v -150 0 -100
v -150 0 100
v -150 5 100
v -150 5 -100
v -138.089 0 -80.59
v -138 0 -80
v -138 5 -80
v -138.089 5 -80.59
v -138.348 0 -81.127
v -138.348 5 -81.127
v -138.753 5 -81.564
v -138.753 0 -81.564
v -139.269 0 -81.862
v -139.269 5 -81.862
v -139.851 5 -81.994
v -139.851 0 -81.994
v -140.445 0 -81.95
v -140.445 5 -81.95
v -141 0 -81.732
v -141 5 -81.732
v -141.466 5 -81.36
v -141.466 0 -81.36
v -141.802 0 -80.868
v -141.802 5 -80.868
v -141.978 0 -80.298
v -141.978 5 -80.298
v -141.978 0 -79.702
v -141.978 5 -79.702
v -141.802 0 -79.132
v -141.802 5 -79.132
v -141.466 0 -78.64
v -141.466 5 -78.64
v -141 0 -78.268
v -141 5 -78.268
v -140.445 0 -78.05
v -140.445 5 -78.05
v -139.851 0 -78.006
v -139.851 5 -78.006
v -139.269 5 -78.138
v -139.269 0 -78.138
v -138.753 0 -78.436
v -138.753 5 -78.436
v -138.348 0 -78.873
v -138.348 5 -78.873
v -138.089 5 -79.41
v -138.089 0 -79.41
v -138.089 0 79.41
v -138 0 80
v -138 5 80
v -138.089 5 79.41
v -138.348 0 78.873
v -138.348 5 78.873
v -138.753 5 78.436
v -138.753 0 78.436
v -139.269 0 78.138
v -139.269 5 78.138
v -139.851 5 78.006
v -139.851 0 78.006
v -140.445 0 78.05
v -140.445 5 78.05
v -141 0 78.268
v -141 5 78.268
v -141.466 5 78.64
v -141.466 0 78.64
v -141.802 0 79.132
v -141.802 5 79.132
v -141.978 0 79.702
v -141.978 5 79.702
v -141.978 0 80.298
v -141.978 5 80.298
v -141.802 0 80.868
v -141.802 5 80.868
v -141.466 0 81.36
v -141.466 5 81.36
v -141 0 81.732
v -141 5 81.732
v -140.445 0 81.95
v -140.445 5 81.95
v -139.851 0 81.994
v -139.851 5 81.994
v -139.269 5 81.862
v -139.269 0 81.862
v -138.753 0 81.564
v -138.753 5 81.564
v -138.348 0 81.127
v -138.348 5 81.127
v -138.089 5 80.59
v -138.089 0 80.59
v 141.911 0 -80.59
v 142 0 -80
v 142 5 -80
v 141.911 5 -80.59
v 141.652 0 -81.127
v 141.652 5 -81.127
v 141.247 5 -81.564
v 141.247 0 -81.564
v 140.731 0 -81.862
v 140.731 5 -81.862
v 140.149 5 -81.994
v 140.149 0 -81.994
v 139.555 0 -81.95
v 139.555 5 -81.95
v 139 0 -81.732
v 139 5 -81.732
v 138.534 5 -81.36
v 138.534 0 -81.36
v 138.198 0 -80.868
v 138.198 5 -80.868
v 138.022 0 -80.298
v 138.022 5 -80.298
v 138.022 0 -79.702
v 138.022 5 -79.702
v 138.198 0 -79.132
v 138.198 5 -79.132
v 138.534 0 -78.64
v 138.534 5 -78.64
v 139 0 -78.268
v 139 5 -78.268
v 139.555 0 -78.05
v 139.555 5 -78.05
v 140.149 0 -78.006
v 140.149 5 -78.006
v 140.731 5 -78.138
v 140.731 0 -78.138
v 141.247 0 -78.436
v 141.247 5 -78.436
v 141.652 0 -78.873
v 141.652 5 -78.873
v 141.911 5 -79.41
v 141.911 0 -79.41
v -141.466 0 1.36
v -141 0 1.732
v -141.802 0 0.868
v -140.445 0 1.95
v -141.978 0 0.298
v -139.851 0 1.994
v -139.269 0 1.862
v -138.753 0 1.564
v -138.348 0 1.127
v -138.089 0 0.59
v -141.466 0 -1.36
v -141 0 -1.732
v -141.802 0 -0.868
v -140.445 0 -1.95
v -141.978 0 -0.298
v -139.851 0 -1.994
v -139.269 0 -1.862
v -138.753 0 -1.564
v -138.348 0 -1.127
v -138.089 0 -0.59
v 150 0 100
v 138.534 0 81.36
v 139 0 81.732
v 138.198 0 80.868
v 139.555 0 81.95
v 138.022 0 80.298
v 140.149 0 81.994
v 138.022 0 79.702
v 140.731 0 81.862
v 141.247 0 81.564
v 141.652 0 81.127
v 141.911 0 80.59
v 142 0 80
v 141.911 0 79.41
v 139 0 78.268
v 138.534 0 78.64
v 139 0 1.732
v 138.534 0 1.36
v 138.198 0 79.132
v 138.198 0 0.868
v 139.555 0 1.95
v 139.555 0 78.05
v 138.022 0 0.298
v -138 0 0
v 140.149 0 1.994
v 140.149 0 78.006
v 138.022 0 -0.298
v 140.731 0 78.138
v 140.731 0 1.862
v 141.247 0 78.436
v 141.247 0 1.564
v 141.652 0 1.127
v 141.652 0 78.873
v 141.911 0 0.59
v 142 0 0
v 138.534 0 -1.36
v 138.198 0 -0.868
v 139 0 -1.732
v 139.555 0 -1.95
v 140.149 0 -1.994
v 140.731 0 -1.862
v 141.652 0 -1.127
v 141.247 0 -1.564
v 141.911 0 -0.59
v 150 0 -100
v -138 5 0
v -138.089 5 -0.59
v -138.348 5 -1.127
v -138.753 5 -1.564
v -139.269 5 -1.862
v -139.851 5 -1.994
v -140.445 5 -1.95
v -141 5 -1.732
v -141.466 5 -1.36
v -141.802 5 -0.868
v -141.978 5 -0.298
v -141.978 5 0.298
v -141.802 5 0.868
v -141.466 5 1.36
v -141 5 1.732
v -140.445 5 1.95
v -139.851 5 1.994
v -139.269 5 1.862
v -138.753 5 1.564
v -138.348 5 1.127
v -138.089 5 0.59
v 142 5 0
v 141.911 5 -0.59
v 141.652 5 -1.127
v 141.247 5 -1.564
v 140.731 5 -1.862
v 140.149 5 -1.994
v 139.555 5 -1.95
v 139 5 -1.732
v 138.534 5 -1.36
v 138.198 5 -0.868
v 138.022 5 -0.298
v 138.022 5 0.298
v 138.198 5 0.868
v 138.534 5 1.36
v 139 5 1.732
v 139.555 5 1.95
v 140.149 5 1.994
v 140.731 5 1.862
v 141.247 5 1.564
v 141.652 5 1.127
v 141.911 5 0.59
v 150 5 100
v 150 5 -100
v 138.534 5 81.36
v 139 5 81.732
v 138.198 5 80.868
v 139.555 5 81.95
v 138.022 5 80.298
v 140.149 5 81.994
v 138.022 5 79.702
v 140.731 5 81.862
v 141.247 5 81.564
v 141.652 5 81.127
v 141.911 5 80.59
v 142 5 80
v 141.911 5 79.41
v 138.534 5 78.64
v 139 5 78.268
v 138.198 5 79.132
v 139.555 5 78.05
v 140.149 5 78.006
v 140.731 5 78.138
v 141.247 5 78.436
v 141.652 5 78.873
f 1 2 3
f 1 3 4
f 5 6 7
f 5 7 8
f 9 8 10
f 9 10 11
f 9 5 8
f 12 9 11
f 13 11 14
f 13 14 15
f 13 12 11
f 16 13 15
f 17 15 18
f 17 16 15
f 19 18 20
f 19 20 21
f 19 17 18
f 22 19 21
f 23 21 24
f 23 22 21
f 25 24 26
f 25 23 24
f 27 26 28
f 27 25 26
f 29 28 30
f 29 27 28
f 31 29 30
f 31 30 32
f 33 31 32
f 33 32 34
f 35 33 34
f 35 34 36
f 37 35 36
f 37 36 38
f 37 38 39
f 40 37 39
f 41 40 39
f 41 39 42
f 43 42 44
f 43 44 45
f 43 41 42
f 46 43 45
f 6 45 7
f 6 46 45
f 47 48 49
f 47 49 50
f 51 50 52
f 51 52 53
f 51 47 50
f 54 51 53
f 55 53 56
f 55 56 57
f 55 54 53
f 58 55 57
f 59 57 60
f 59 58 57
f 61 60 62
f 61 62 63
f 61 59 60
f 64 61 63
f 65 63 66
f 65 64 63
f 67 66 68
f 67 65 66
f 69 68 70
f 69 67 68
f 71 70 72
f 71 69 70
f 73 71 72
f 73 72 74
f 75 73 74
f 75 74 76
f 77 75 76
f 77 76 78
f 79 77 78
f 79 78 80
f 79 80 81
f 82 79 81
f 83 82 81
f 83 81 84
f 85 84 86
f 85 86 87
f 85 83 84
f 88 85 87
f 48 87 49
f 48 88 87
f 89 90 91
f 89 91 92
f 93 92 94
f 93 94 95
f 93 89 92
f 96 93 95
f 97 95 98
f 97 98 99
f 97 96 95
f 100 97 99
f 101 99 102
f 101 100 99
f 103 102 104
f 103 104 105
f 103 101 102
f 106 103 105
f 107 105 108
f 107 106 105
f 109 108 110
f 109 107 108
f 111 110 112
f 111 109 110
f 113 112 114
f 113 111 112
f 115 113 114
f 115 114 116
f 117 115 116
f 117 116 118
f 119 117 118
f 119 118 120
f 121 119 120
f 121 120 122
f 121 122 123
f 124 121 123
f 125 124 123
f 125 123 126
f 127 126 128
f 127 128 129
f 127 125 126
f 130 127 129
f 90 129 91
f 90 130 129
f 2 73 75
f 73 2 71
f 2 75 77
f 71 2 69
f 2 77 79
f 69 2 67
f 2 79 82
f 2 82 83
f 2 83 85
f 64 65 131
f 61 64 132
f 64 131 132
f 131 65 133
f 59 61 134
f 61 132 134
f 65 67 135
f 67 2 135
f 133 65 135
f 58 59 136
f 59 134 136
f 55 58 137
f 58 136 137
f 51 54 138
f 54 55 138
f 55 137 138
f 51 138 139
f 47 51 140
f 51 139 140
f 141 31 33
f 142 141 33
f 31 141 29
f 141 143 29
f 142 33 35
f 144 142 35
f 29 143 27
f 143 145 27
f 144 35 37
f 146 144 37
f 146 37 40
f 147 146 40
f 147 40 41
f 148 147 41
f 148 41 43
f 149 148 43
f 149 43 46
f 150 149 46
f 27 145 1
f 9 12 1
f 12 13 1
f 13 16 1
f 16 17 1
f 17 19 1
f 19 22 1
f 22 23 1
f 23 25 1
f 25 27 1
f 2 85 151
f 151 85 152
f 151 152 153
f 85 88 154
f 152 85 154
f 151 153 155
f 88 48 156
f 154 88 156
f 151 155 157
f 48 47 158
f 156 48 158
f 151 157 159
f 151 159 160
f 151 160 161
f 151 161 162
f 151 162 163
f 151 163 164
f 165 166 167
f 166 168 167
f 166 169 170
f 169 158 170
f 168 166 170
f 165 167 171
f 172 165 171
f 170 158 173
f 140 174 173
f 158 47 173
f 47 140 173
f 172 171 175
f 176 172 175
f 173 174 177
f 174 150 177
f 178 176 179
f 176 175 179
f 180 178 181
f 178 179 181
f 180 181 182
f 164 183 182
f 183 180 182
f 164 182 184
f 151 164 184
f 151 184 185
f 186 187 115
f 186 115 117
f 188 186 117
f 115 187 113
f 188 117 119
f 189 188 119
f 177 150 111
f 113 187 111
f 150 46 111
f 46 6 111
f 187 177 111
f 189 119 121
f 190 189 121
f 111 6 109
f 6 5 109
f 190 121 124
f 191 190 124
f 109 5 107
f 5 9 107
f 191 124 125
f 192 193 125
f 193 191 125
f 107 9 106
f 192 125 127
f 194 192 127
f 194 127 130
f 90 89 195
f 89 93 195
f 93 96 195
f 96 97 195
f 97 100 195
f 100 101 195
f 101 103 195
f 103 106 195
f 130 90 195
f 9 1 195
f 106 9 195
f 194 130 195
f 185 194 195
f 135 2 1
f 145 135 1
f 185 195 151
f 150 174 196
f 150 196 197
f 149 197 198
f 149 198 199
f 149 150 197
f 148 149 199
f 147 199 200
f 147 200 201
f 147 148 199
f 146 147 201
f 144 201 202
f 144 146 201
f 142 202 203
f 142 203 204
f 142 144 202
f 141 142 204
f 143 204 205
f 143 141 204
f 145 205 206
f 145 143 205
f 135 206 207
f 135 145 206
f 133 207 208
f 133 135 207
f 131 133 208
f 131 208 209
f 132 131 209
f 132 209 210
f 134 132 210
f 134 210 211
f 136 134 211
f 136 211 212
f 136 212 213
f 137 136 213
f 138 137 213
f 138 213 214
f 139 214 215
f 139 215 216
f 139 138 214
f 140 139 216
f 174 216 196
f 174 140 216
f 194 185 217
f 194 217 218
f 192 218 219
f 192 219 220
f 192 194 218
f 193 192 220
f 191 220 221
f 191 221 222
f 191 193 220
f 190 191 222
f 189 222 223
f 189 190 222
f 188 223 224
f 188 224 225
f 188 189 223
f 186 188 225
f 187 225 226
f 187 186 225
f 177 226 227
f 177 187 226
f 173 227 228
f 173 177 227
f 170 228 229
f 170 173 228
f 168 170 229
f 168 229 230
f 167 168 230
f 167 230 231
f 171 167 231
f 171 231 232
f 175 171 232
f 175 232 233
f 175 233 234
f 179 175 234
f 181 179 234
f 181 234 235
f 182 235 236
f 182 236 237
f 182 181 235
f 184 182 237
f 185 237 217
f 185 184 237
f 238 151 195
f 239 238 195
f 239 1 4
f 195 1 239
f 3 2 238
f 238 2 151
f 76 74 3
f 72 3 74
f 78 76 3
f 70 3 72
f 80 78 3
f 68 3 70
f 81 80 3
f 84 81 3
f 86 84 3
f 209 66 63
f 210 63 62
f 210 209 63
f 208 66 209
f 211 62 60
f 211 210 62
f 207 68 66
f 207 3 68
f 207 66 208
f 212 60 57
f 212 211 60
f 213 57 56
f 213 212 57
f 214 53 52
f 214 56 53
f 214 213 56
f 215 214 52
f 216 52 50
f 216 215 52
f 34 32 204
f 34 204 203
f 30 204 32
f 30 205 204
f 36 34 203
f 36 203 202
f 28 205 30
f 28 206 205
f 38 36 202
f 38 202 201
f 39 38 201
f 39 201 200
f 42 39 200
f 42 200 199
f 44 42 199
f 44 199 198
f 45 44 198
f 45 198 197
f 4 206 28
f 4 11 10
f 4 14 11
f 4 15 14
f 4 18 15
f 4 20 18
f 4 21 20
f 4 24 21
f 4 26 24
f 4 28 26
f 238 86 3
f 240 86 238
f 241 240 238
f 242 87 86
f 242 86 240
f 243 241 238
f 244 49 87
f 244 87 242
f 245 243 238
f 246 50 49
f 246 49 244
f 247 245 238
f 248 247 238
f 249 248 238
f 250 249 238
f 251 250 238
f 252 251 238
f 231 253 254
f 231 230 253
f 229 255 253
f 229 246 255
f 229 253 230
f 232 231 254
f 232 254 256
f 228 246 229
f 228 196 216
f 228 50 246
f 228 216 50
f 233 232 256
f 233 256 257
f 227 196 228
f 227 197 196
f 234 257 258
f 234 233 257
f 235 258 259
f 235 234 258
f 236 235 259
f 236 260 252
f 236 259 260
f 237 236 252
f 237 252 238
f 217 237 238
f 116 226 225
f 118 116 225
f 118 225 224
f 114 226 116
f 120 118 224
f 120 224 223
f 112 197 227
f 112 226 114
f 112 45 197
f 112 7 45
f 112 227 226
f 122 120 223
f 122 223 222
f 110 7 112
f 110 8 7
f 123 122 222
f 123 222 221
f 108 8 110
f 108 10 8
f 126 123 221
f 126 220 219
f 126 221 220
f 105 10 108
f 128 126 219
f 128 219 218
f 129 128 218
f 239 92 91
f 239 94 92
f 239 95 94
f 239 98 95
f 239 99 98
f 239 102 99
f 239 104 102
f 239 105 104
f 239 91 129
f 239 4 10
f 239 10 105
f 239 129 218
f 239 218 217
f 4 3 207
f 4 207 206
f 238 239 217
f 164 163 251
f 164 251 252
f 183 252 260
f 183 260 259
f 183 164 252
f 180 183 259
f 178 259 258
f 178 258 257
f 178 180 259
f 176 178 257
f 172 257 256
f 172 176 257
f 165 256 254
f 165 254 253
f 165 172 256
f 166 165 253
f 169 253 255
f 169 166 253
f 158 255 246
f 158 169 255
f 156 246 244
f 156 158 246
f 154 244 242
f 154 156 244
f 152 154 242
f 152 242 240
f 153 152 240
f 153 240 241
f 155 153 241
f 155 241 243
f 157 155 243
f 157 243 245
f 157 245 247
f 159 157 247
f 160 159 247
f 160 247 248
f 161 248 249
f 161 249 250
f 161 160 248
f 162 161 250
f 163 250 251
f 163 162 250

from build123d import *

# Parameters (mm, degrees)
SKETCH1_W           = 300
SKETCH1_H           = 200
SKETCH1_R           = 2
BOSS_EXTRUDE1_DEPTH = 5


with BuildPart() as part:
    # Sketch1 → Boss-Extrude1 (new body)
    with BuildSketch(Plane(origin=(0, 0, 0), x_dir=(1, 0, 0), z_dir=(0, 1, 0))):
        Rectangle(SKETCH1_W, SKETCH1_H)
        with Locations((-140, 80)):
            Circle(SKETCH1_R, mode=Mode.SUBTRACT)
        with Locations((-140, -80)):
            Circle(SKETCH1_R, mode=Mode.SUBTRACT)
        with Locations((-140, 0)):
            Circle(SKETCH1_R, mode=Mode.SUBTRACT)
        with Locations((140, -80)):
            Circle(SKETCH1_R, mode=Mode.SUBTRACT)
        with Locations((140, 0)):
            Circle(SKETCH1_R, mode=Mode.SUBTRACT)
        with Locations((140, 80)):
            Circle(SKETCH1_R, mode=Mode.SUBTRACT)
    extrude(amount=BOSS_EXTRUDE1_DEPTH)


solid = part.part
